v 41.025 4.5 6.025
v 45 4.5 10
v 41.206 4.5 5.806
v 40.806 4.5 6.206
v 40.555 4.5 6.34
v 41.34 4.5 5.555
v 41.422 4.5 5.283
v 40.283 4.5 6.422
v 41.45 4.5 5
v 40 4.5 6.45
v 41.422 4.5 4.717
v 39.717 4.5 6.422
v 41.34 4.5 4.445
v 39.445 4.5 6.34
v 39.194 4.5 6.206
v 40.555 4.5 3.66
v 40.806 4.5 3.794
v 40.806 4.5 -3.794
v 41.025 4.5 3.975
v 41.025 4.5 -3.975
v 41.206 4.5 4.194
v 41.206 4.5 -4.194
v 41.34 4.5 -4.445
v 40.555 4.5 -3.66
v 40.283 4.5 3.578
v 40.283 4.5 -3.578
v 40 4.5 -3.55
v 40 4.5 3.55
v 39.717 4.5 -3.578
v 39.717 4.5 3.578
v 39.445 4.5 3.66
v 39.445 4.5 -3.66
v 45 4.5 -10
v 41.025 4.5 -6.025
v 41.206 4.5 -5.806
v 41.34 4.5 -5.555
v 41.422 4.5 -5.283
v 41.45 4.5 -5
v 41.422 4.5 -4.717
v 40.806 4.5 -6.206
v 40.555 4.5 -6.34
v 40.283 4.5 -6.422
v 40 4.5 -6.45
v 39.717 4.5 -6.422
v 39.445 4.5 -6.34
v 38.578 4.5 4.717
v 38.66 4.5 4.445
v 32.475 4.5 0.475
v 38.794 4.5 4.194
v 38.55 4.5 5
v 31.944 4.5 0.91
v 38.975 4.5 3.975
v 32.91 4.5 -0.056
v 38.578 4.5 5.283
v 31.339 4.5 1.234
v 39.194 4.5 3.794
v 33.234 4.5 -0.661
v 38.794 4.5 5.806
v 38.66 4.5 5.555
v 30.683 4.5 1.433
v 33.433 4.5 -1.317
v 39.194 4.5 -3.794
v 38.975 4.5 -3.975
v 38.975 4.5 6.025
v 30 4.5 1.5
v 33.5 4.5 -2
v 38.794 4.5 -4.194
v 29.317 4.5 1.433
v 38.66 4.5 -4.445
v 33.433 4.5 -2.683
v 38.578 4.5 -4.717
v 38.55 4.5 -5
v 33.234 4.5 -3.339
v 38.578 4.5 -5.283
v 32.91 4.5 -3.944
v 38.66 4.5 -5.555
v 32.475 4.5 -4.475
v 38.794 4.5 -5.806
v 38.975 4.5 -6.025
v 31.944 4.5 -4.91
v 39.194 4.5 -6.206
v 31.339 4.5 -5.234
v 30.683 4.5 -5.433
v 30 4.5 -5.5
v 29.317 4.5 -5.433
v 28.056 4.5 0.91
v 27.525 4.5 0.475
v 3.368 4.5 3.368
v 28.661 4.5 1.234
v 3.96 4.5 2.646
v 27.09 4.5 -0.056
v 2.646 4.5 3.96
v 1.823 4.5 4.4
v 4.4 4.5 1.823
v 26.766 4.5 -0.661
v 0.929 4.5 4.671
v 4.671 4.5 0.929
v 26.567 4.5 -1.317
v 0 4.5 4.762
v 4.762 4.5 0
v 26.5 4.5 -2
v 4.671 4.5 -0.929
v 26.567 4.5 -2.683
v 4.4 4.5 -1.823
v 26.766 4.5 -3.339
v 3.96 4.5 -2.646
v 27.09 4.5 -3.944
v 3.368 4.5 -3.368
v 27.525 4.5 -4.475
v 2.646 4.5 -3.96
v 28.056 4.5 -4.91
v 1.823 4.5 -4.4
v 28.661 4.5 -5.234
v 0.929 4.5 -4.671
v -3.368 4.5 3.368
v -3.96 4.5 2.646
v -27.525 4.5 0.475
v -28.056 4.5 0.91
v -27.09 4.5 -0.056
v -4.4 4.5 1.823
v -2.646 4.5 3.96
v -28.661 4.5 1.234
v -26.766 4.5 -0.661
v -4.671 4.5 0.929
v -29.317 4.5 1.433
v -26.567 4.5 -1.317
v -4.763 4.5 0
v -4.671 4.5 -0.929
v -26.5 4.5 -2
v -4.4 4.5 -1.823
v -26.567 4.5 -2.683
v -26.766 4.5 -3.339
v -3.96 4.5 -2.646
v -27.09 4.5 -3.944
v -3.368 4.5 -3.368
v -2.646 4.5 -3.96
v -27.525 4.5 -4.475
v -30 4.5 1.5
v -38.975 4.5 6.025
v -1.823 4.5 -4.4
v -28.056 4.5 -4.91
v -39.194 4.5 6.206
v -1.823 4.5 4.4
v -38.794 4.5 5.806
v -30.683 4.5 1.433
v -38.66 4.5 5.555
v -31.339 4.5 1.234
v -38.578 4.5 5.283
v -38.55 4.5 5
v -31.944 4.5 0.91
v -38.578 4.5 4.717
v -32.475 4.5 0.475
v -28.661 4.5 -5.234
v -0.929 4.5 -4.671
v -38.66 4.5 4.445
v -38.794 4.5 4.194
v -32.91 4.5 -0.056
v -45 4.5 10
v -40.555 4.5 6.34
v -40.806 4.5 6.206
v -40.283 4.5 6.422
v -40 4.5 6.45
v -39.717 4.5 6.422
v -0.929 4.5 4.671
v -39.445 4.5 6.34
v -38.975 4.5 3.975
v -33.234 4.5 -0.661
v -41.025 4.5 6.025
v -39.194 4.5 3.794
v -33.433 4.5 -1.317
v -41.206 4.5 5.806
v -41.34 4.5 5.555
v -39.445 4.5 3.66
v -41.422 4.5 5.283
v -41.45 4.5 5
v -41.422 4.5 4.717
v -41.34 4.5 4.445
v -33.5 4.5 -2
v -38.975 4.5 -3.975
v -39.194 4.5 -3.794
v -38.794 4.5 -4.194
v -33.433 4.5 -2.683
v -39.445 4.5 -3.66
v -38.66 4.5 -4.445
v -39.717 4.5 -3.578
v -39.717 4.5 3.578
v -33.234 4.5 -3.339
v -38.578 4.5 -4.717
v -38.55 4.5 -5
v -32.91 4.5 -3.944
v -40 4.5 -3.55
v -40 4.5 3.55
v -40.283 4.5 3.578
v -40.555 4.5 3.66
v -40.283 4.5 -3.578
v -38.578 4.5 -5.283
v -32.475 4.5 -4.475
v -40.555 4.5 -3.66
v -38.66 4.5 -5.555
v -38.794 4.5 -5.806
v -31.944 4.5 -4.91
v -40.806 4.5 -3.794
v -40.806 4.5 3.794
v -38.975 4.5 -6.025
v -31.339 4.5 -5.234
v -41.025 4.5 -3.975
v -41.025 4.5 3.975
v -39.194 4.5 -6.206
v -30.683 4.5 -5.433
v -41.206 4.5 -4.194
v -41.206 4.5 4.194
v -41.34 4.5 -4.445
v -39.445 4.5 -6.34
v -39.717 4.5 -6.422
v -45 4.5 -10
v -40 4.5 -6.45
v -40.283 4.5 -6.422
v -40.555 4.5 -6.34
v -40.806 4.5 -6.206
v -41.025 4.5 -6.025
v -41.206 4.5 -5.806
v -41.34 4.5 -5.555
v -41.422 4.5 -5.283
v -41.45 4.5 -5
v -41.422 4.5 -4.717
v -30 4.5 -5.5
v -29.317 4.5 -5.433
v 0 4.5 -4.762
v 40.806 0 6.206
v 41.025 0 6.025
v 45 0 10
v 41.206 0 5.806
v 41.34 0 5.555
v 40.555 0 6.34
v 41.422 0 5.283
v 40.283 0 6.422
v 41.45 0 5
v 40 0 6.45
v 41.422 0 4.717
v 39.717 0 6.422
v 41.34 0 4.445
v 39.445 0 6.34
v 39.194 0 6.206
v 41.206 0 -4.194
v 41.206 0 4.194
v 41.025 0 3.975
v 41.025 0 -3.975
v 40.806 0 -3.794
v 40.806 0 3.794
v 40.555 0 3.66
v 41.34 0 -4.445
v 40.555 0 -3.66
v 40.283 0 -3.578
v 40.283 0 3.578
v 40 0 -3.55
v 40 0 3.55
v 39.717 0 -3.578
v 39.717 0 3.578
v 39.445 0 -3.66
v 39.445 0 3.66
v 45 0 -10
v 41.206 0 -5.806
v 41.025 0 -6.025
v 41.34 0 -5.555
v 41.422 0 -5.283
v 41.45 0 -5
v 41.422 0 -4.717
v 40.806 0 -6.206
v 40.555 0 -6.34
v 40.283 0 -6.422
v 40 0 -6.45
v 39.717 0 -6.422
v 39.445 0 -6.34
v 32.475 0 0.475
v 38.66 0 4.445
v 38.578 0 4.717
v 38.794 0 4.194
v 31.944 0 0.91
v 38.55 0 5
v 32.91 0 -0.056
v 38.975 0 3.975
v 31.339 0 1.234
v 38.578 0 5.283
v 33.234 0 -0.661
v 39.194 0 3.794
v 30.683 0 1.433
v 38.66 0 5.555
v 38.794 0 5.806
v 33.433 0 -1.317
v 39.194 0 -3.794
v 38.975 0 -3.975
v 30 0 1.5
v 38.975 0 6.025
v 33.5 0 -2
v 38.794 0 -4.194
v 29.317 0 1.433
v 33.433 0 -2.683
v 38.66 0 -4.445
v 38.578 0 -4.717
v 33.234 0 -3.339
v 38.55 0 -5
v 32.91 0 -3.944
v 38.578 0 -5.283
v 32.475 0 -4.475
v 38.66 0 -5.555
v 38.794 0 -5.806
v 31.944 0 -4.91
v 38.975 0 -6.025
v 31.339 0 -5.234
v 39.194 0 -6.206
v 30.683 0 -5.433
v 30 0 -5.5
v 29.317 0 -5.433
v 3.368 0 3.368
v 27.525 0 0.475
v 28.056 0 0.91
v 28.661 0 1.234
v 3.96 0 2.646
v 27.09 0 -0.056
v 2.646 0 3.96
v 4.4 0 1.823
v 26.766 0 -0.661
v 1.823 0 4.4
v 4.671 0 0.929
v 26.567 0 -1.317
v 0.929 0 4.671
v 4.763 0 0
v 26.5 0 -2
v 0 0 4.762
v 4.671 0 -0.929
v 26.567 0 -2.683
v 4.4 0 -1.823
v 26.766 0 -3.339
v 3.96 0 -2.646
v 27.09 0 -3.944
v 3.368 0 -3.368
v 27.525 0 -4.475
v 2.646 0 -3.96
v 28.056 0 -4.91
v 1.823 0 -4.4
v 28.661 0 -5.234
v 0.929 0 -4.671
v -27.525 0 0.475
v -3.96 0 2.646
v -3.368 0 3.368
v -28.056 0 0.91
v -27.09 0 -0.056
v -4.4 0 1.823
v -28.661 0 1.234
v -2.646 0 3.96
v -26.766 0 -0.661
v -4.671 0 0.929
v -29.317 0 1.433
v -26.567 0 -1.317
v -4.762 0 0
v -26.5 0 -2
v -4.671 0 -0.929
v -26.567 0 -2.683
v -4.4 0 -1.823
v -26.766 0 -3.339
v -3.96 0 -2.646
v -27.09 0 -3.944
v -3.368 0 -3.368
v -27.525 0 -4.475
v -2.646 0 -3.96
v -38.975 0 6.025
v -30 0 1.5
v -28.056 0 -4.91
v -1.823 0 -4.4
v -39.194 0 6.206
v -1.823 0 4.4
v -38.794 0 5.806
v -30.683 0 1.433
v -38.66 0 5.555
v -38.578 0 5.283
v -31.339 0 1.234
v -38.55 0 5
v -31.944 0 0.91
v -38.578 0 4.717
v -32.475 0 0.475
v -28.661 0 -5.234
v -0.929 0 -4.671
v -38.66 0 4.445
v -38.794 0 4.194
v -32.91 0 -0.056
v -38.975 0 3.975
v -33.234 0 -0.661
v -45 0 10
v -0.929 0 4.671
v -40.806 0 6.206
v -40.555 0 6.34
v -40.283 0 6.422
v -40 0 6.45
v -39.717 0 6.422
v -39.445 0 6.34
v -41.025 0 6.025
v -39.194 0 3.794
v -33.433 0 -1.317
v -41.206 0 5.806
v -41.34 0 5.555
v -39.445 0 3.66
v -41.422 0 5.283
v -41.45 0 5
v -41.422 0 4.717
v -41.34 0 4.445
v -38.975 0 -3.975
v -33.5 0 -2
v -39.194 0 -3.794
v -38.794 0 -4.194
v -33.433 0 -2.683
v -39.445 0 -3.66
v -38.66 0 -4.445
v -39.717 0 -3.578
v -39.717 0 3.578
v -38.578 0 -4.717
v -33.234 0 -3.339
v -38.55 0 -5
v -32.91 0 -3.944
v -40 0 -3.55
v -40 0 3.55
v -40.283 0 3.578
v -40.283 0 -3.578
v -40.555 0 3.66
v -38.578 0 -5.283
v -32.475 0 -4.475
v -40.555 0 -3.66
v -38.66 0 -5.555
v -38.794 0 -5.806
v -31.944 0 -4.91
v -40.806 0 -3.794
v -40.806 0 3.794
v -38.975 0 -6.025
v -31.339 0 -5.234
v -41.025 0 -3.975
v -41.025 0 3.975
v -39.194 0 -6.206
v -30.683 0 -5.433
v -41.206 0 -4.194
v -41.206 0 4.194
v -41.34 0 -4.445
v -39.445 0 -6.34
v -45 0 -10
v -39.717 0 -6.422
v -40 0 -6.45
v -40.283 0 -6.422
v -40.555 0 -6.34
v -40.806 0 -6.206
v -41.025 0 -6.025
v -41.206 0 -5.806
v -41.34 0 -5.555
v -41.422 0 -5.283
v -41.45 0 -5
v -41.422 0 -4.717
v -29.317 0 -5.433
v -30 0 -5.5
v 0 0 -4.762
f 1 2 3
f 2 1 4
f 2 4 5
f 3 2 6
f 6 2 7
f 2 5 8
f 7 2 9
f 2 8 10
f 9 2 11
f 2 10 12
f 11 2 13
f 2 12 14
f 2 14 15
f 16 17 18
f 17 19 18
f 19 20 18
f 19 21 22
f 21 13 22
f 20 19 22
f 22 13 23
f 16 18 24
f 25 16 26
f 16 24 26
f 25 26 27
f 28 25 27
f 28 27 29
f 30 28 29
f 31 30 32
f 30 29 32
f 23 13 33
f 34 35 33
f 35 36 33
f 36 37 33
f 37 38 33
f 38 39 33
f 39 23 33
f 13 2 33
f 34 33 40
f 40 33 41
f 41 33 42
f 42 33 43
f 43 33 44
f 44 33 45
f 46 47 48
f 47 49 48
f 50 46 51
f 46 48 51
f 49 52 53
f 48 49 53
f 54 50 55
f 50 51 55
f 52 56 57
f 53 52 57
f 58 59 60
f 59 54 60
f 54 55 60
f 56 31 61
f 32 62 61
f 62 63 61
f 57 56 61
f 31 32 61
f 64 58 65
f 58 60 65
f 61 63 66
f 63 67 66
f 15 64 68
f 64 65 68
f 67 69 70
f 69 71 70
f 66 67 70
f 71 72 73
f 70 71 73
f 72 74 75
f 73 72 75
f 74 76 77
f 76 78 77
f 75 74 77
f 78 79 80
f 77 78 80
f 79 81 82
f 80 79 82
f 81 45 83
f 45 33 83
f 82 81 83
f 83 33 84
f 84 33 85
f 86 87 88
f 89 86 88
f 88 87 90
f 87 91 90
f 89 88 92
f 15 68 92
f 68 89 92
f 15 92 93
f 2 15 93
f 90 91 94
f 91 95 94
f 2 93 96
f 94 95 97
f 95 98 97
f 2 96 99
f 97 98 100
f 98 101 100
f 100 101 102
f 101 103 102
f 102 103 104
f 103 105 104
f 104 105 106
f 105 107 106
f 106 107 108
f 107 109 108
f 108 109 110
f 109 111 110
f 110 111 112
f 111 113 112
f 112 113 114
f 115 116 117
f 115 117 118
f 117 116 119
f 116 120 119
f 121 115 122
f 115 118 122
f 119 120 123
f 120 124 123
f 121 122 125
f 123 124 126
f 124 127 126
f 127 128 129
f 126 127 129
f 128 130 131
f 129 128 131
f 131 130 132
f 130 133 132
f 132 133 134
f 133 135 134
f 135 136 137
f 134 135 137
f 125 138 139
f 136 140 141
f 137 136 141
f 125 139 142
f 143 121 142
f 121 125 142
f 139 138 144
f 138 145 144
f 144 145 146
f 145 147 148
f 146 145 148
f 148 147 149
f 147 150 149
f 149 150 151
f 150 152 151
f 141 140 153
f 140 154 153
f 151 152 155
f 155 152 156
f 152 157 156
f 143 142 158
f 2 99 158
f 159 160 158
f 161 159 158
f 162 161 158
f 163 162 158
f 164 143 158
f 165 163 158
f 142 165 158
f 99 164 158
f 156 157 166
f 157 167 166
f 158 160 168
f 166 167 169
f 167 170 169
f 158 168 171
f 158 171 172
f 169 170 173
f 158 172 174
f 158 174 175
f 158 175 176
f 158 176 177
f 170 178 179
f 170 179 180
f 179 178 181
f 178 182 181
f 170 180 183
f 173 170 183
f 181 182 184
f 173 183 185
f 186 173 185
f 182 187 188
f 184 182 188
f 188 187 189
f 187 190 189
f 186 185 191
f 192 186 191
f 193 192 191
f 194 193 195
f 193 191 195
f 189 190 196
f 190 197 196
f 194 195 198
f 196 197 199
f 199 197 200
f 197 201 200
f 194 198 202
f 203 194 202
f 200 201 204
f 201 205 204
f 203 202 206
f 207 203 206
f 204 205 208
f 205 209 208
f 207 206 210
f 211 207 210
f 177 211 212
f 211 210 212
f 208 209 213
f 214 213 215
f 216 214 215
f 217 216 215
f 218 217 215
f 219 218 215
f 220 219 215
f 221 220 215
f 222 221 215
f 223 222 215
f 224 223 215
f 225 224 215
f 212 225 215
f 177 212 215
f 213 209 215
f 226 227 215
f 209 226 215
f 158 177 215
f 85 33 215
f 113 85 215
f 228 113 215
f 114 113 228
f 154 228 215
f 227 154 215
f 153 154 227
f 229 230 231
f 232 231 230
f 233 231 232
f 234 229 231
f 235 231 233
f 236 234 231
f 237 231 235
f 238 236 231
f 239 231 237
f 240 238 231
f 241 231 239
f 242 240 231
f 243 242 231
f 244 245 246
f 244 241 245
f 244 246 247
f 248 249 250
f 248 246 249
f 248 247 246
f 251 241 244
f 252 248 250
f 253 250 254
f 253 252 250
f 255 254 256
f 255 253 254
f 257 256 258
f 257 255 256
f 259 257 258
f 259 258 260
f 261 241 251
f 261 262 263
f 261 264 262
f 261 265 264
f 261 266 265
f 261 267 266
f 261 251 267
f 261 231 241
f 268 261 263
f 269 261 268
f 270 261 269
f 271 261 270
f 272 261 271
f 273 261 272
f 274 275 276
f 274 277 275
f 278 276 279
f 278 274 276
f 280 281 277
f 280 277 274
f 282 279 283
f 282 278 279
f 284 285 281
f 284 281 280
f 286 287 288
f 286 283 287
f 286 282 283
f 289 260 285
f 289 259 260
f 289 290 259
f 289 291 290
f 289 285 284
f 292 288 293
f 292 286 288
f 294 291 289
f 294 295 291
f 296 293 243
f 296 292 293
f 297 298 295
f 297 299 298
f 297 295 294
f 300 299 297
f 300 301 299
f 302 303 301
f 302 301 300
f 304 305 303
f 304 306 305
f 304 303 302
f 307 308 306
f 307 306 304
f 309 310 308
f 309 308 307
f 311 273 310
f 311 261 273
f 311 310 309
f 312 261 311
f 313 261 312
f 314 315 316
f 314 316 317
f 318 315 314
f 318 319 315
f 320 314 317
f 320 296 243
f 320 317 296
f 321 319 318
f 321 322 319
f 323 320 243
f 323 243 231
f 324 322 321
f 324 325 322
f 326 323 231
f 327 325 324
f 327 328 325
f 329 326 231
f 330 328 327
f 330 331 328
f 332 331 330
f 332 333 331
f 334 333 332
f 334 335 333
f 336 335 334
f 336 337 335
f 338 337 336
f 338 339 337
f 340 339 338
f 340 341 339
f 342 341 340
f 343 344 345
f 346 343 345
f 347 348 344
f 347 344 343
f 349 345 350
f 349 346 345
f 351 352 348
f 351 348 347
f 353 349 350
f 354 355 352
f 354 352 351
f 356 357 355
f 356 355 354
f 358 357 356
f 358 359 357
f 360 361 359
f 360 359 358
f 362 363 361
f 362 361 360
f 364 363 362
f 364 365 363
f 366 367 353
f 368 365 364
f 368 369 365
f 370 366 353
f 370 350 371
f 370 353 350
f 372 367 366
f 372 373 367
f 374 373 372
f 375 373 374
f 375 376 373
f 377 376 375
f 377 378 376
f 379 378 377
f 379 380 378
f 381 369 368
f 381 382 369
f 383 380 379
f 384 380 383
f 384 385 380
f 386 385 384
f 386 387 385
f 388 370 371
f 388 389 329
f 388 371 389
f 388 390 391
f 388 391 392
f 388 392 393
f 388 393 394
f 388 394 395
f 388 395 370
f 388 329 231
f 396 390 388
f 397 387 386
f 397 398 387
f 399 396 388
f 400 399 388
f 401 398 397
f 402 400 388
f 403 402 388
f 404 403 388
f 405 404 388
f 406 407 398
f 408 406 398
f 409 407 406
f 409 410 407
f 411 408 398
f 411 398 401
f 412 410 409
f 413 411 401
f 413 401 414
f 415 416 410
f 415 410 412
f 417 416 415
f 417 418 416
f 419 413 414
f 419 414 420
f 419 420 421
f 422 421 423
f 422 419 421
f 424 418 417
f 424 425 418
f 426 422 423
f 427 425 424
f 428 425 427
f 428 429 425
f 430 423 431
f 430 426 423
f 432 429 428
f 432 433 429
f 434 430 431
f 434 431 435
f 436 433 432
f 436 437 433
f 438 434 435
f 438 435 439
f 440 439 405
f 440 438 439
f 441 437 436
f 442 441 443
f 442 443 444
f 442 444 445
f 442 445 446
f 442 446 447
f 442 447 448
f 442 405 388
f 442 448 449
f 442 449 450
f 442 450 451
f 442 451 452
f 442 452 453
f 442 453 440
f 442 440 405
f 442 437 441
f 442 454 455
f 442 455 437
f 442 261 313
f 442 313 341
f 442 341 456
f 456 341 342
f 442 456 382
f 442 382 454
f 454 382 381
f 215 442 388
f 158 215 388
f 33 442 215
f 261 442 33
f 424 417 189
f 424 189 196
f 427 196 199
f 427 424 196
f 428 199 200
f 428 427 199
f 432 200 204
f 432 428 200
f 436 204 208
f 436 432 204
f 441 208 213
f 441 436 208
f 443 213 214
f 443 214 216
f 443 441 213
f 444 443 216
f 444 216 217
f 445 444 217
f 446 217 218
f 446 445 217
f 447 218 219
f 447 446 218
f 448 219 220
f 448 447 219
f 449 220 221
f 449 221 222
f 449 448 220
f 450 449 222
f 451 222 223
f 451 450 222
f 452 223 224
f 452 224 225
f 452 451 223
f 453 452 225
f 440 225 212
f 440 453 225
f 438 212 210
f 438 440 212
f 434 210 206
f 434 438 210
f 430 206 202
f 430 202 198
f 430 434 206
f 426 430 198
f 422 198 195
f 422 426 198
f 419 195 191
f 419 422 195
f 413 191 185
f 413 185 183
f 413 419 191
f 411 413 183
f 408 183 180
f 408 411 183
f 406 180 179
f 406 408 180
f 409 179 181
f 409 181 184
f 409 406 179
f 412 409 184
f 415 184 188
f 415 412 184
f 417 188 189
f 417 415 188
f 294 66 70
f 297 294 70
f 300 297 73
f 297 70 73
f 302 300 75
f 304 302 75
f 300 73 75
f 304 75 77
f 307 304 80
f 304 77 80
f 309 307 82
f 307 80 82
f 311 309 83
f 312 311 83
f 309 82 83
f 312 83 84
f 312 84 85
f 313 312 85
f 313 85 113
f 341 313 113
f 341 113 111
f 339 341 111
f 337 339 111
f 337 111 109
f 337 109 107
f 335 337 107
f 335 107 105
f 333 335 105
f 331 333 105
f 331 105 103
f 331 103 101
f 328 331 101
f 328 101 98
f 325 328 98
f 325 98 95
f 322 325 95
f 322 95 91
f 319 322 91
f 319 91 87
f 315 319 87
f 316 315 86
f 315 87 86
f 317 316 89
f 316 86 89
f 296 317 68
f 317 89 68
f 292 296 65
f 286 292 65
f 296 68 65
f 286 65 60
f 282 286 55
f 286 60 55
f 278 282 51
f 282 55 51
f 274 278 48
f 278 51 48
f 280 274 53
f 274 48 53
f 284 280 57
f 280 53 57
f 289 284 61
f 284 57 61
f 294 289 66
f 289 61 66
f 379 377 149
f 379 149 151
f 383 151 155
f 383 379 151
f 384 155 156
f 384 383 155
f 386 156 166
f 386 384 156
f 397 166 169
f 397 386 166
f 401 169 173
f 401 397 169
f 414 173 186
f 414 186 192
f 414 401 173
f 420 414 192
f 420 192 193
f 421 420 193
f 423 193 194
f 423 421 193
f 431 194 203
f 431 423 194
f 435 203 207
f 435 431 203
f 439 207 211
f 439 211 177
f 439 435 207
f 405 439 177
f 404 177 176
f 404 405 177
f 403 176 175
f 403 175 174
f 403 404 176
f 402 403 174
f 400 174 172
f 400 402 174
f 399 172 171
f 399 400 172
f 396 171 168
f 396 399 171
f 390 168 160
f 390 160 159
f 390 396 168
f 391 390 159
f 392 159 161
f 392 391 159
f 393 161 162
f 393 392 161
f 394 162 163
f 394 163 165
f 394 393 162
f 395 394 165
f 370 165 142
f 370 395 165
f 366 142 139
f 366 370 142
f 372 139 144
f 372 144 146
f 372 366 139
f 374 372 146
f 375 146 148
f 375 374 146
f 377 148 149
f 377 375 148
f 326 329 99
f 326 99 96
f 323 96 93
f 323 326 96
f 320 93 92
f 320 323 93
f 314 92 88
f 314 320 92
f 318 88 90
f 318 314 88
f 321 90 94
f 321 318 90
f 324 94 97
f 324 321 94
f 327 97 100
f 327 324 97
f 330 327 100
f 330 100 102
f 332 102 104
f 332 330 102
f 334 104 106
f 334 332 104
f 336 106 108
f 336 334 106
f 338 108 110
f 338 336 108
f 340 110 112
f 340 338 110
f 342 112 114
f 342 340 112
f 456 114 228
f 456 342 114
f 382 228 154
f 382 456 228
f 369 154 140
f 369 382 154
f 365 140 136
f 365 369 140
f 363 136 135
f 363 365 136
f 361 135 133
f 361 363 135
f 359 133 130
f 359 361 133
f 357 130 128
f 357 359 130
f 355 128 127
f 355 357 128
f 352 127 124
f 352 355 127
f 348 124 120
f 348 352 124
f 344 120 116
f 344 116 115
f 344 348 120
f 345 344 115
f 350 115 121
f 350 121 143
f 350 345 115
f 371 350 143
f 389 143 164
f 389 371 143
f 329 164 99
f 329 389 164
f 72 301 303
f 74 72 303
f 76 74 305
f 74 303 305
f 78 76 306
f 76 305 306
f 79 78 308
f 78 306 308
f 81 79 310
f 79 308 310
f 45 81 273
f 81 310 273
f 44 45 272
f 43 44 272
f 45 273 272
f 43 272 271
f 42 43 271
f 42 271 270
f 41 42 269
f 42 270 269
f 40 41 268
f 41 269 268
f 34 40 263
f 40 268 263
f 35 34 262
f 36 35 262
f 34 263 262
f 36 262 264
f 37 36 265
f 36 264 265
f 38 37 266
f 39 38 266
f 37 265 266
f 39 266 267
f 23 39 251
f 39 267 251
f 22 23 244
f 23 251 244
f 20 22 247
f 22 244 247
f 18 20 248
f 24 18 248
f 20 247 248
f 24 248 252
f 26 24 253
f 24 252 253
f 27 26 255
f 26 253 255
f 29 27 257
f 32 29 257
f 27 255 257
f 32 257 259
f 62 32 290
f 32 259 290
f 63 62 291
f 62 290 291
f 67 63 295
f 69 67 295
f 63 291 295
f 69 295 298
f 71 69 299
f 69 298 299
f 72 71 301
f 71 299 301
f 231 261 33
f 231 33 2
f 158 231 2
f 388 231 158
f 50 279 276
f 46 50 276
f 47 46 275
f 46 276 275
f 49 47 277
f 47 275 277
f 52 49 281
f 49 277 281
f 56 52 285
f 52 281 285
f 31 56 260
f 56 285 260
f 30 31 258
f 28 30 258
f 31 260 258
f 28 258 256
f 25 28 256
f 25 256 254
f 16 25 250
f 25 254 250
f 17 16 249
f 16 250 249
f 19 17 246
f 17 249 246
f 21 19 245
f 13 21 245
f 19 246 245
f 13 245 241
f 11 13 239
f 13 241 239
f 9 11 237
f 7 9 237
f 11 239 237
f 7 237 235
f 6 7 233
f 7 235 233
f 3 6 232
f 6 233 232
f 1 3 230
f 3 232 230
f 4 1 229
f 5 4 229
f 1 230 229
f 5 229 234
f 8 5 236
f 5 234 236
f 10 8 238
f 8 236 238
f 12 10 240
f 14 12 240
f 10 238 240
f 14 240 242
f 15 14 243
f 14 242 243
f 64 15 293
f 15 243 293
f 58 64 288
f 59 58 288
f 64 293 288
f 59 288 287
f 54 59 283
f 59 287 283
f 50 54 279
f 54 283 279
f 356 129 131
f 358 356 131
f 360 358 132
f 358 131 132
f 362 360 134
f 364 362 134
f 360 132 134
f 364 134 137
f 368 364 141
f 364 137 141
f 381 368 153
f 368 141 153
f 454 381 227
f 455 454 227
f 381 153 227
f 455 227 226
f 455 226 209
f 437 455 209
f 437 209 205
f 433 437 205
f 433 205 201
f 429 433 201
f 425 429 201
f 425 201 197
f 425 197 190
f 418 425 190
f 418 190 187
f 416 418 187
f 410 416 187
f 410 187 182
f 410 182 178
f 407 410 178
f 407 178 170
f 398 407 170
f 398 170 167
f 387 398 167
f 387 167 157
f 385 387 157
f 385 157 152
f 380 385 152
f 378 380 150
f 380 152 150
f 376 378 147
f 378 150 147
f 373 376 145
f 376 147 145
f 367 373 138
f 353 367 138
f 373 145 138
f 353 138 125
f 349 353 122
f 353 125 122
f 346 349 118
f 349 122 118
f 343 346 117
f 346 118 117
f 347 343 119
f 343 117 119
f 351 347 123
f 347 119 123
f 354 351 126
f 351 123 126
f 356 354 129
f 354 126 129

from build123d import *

# Parameters (mm, degrees)
SKETCH1_R           = 1.45
BOSS_EXTRUDE1_DEPTH = 4.5
SKETCH2_R           = 3.5
CUT_EXTRUDE1_DEPTH  = 5.5


with BuildPart() as part:
    # Sketch1 → Boss-Extrude1 (new body)
    with BuildSketch(Plane(origin=(0, 0, 0), x_dir=(1, 0, 0), z_dir=(0, 1, 0))):
        with BuildLine():
            Line((0, 4.7625), (0, 10))
            Line((0, 10), (-45, 10))
            Line((-45, 10), (-45, -10))
            Line((-45, -10), (0, -10))
            Line((0, -10), (0, -4.7625))
            ThreePointArc((0, -4.7625), (-4.7625, 0), (0, 4.7625))
        make_face()
        with Locations((-40, 5)):
            Circle(SKETCH1_R, mode=Mode.SUBTRACT)
        with Locations((-40, -5)):
            Circle(SKETCH1_R, mode=Mode.SUBTRACT)
    boss_extrude1 = extrude(amount=BOSS_EXTRUDE1_DEPTH)

    # Mirror1: Boss-Extrude1 across plane
    add(boss_extrude1.mirror(Plane(origin=(0, 4.5, 10), x_dir=(0, 0, 1), z_dir=(-1, 0, 0))))

    # Sketch2 → Cut-Extrude1 (cut, through all)
    with BuildSketch(Plane(origin=(0, 4.5, 0), x_dir=(1, 0, 0), z_dir=(0, 1, 0))):
        with Locations((-30, 2)):
            Circle(SKETCH2_R)
        with Locations((30, 2)):
            Circle(SKETCH2_R)
    extrude(amount=-CUT_EXTRUDE1_DEPTH, mode=Mode.SUBTRACT)


solid = part.part
